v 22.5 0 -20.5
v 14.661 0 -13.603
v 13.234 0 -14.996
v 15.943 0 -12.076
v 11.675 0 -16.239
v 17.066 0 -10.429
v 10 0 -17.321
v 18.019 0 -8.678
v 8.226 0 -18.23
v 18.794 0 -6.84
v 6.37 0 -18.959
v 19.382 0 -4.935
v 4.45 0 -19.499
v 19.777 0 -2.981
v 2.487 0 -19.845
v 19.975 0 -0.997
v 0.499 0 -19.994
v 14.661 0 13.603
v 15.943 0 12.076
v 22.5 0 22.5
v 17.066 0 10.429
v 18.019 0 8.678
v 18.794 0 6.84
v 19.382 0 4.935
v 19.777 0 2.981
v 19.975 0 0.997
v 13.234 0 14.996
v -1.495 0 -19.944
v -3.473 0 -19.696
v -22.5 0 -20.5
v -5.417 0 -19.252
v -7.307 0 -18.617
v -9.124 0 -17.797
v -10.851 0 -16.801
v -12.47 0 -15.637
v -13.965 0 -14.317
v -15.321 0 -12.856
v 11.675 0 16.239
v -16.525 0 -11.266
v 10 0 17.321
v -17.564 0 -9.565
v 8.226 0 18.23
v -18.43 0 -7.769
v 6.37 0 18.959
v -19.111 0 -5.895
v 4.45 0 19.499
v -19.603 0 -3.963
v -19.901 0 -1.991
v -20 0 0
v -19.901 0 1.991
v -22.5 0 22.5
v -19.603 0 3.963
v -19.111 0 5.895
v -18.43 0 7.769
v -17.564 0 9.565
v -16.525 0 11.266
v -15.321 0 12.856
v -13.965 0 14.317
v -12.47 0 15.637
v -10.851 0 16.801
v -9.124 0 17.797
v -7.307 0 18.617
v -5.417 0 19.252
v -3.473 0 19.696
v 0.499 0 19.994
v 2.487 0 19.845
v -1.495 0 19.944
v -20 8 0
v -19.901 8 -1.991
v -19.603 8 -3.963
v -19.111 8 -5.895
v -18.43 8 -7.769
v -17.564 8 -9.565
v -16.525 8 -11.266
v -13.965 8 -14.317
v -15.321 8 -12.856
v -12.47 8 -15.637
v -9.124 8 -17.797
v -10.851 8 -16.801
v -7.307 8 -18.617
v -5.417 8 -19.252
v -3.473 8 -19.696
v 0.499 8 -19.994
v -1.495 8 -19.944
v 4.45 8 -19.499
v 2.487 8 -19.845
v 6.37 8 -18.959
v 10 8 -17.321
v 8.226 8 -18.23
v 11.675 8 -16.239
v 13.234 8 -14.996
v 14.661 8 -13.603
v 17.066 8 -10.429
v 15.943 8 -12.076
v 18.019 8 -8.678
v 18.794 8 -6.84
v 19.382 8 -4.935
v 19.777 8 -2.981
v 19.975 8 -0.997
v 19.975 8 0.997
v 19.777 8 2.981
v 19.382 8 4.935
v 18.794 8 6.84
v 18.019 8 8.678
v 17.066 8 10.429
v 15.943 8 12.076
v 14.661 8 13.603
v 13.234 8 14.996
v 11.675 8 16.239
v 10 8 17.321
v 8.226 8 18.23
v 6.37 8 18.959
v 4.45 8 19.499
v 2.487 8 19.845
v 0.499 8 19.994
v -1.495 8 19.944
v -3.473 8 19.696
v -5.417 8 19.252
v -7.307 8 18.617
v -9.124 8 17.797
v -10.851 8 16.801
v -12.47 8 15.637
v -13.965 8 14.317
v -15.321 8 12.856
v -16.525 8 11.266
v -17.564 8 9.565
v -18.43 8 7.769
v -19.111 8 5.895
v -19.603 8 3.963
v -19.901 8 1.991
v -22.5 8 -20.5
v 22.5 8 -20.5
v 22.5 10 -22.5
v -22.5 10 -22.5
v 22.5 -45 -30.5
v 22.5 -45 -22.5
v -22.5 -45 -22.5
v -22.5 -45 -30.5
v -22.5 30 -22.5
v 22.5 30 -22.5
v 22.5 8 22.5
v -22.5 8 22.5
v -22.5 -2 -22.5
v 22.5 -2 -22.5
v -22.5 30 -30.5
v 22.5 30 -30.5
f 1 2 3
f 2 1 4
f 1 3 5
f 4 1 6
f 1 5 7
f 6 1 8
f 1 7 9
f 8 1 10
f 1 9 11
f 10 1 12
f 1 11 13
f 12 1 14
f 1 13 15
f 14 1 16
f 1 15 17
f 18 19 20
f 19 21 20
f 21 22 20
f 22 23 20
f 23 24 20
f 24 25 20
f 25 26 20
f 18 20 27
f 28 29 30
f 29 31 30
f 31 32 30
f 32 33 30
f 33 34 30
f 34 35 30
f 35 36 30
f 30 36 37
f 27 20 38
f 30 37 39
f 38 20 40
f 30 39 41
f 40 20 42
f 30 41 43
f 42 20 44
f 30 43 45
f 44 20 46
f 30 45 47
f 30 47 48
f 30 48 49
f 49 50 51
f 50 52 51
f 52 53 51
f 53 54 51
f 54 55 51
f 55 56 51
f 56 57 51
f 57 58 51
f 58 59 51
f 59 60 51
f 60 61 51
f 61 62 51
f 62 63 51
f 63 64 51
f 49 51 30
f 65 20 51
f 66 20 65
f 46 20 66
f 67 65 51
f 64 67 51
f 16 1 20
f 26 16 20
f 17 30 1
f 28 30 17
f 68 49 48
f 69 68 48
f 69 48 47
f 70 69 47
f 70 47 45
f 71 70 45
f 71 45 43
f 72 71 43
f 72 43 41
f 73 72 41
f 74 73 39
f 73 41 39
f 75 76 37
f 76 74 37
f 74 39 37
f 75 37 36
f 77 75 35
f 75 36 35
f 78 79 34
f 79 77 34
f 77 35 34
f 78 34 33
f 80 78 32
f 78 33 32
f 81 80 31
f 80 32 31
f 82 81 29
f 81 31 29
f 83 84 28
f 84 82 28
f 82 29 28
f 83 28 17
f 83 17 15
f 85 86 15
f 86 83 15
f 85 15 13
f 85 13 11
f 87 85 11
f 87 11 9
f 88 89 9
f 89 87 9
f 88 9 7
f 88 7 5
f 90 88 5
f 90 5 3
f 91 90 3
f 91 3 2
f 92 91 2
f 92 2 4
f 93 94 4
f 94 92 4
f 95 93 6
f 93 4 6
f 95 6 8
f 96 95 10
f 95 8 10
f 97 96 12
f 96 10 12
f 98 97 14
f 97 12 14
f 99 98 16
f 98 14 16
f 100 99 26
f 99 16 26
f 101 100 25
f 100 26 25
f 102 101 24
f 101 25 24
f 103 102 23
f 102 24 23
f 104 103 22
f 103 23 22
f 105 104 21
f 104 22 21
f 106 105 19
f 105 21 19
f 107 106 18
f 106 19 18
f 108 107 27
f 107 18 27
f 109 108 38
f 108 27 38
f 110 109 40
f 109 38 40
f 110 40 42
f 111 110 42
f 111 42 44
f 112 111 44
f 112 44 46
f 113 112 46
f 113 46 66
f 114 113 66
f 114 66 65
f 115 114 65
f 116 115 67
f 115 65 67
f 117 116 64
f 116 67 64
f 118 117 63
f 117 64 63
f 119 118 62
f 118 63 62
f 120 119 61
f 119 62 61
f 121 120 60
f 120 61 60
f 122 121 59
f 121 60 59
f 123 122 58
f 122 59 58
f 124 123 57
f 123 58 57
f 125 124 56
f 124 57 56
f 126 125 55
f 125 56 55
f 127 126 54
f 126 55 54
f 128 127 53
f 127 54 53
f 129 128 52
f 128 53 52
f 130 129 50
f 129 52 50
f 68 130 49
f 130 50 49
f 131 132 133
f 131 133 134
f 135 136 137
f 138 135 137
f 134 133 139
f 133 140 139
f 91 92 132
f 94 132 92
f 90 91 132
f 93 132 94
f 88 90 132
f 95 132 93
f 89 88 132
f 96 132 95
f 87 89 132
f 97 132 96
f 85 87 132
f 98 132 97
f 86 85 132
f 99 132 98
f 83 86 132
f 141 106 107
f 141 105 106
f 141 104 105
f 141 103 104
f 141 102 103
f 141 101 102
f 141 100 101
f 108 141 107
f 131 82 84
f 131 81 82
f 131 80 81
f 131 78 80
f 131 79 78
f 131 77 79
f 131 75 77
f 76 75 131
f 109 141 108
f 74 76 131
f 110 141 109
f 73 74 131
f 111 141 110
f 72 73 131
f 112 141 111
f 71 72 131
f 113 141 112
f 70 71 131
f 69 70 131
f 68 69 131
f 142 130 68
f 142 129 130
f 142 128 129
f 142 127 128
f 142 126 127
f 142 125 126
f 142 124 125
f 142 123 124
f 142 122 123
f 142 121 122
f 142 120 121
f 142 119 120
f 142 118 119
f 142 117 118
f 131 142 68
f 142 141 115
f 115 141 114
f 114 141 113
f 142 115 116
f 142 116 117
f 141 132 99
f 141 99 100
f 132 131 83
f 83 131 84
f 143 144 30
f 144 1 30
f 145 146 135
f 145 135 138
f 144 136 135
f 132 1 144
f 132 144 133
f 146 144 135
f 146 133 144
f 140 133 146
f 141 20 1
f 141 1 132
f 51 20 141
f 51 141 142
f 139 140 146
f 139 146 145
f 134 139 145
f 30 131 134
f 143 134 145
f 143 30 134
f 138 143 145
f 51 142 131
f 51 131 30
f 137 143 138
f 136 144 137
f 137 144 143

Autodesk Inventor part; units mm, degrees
ref_plane "YZ Plane" through (0, 0, 0) normal (1, 0, 0) x (0, 1, 0)
ref_plane "XZ Plane" through (0, 0, 0) normal (0, 1, 0) x (-1, 0, 0)
ref_plane "XY Plane" through (0, 0, 0) normal (0, 0, 1) x (1, 0, 0)
sketch "Sketch1" plane through (0, 0, 0) normal (0, 1, 0) x (-1, 0, 0)
  line L0 (-22.5, 22.5) -> (22.5, 22.5)
  line L1 (22.5, 22.5) -> (22.5, -22.5)
  line L2 (22.5, -22.5) -> (-22.5, -22.5)
  line L3 (-22.5, -22.5) -> (-22.5, 22.5)
  line L4 (-22.5, 22.5) -> (22.5, -22.5) construction
  line L5 (22.5, 22.5) -> (-22.5, -22.5) construction
  circle A0 centre (0, 0) radius 20
  dimension "d0" = 40
  dimension "d1" = 45
  dimension "d2" = 45
extrude "Extrusion1" add sketch "Sketch1" along normal blind 8
sketch "Sketch2" plane through (22.5, 0, -22.5) normal (0, 0, -1) x (-1, 0, 0)
  line L0 (0, 0) -> (45, 0) projected
  line L1 (45, 0) -> (0, 0)
  line L2 (0, 0) -> (0, 30)
  line L3 (0, 30) -> (45, 30)
  line L4 (45, 30) -> (45, 0)
  line L5 (45, 0) -> (0, 0)
  line L6 (0, 0) -> (0, -45)
  line L7 (0, -45) -> (45, -45)
  line L8 (45, -45) -> (45, 0)
  point P0 (22.5, 0)
  dimension "d5" = 30
  dimension "d8" = 45
extrude "Extrusion2" add sketch "Sketch2" along normal blind 8
chamfer "Chamfer1" distance 2 angle 45 2 edges at (0, 8, -22.5) (0, 0, -22.5)
properties part number "Air Filter Bracket" material "Acetal Resin, White"
